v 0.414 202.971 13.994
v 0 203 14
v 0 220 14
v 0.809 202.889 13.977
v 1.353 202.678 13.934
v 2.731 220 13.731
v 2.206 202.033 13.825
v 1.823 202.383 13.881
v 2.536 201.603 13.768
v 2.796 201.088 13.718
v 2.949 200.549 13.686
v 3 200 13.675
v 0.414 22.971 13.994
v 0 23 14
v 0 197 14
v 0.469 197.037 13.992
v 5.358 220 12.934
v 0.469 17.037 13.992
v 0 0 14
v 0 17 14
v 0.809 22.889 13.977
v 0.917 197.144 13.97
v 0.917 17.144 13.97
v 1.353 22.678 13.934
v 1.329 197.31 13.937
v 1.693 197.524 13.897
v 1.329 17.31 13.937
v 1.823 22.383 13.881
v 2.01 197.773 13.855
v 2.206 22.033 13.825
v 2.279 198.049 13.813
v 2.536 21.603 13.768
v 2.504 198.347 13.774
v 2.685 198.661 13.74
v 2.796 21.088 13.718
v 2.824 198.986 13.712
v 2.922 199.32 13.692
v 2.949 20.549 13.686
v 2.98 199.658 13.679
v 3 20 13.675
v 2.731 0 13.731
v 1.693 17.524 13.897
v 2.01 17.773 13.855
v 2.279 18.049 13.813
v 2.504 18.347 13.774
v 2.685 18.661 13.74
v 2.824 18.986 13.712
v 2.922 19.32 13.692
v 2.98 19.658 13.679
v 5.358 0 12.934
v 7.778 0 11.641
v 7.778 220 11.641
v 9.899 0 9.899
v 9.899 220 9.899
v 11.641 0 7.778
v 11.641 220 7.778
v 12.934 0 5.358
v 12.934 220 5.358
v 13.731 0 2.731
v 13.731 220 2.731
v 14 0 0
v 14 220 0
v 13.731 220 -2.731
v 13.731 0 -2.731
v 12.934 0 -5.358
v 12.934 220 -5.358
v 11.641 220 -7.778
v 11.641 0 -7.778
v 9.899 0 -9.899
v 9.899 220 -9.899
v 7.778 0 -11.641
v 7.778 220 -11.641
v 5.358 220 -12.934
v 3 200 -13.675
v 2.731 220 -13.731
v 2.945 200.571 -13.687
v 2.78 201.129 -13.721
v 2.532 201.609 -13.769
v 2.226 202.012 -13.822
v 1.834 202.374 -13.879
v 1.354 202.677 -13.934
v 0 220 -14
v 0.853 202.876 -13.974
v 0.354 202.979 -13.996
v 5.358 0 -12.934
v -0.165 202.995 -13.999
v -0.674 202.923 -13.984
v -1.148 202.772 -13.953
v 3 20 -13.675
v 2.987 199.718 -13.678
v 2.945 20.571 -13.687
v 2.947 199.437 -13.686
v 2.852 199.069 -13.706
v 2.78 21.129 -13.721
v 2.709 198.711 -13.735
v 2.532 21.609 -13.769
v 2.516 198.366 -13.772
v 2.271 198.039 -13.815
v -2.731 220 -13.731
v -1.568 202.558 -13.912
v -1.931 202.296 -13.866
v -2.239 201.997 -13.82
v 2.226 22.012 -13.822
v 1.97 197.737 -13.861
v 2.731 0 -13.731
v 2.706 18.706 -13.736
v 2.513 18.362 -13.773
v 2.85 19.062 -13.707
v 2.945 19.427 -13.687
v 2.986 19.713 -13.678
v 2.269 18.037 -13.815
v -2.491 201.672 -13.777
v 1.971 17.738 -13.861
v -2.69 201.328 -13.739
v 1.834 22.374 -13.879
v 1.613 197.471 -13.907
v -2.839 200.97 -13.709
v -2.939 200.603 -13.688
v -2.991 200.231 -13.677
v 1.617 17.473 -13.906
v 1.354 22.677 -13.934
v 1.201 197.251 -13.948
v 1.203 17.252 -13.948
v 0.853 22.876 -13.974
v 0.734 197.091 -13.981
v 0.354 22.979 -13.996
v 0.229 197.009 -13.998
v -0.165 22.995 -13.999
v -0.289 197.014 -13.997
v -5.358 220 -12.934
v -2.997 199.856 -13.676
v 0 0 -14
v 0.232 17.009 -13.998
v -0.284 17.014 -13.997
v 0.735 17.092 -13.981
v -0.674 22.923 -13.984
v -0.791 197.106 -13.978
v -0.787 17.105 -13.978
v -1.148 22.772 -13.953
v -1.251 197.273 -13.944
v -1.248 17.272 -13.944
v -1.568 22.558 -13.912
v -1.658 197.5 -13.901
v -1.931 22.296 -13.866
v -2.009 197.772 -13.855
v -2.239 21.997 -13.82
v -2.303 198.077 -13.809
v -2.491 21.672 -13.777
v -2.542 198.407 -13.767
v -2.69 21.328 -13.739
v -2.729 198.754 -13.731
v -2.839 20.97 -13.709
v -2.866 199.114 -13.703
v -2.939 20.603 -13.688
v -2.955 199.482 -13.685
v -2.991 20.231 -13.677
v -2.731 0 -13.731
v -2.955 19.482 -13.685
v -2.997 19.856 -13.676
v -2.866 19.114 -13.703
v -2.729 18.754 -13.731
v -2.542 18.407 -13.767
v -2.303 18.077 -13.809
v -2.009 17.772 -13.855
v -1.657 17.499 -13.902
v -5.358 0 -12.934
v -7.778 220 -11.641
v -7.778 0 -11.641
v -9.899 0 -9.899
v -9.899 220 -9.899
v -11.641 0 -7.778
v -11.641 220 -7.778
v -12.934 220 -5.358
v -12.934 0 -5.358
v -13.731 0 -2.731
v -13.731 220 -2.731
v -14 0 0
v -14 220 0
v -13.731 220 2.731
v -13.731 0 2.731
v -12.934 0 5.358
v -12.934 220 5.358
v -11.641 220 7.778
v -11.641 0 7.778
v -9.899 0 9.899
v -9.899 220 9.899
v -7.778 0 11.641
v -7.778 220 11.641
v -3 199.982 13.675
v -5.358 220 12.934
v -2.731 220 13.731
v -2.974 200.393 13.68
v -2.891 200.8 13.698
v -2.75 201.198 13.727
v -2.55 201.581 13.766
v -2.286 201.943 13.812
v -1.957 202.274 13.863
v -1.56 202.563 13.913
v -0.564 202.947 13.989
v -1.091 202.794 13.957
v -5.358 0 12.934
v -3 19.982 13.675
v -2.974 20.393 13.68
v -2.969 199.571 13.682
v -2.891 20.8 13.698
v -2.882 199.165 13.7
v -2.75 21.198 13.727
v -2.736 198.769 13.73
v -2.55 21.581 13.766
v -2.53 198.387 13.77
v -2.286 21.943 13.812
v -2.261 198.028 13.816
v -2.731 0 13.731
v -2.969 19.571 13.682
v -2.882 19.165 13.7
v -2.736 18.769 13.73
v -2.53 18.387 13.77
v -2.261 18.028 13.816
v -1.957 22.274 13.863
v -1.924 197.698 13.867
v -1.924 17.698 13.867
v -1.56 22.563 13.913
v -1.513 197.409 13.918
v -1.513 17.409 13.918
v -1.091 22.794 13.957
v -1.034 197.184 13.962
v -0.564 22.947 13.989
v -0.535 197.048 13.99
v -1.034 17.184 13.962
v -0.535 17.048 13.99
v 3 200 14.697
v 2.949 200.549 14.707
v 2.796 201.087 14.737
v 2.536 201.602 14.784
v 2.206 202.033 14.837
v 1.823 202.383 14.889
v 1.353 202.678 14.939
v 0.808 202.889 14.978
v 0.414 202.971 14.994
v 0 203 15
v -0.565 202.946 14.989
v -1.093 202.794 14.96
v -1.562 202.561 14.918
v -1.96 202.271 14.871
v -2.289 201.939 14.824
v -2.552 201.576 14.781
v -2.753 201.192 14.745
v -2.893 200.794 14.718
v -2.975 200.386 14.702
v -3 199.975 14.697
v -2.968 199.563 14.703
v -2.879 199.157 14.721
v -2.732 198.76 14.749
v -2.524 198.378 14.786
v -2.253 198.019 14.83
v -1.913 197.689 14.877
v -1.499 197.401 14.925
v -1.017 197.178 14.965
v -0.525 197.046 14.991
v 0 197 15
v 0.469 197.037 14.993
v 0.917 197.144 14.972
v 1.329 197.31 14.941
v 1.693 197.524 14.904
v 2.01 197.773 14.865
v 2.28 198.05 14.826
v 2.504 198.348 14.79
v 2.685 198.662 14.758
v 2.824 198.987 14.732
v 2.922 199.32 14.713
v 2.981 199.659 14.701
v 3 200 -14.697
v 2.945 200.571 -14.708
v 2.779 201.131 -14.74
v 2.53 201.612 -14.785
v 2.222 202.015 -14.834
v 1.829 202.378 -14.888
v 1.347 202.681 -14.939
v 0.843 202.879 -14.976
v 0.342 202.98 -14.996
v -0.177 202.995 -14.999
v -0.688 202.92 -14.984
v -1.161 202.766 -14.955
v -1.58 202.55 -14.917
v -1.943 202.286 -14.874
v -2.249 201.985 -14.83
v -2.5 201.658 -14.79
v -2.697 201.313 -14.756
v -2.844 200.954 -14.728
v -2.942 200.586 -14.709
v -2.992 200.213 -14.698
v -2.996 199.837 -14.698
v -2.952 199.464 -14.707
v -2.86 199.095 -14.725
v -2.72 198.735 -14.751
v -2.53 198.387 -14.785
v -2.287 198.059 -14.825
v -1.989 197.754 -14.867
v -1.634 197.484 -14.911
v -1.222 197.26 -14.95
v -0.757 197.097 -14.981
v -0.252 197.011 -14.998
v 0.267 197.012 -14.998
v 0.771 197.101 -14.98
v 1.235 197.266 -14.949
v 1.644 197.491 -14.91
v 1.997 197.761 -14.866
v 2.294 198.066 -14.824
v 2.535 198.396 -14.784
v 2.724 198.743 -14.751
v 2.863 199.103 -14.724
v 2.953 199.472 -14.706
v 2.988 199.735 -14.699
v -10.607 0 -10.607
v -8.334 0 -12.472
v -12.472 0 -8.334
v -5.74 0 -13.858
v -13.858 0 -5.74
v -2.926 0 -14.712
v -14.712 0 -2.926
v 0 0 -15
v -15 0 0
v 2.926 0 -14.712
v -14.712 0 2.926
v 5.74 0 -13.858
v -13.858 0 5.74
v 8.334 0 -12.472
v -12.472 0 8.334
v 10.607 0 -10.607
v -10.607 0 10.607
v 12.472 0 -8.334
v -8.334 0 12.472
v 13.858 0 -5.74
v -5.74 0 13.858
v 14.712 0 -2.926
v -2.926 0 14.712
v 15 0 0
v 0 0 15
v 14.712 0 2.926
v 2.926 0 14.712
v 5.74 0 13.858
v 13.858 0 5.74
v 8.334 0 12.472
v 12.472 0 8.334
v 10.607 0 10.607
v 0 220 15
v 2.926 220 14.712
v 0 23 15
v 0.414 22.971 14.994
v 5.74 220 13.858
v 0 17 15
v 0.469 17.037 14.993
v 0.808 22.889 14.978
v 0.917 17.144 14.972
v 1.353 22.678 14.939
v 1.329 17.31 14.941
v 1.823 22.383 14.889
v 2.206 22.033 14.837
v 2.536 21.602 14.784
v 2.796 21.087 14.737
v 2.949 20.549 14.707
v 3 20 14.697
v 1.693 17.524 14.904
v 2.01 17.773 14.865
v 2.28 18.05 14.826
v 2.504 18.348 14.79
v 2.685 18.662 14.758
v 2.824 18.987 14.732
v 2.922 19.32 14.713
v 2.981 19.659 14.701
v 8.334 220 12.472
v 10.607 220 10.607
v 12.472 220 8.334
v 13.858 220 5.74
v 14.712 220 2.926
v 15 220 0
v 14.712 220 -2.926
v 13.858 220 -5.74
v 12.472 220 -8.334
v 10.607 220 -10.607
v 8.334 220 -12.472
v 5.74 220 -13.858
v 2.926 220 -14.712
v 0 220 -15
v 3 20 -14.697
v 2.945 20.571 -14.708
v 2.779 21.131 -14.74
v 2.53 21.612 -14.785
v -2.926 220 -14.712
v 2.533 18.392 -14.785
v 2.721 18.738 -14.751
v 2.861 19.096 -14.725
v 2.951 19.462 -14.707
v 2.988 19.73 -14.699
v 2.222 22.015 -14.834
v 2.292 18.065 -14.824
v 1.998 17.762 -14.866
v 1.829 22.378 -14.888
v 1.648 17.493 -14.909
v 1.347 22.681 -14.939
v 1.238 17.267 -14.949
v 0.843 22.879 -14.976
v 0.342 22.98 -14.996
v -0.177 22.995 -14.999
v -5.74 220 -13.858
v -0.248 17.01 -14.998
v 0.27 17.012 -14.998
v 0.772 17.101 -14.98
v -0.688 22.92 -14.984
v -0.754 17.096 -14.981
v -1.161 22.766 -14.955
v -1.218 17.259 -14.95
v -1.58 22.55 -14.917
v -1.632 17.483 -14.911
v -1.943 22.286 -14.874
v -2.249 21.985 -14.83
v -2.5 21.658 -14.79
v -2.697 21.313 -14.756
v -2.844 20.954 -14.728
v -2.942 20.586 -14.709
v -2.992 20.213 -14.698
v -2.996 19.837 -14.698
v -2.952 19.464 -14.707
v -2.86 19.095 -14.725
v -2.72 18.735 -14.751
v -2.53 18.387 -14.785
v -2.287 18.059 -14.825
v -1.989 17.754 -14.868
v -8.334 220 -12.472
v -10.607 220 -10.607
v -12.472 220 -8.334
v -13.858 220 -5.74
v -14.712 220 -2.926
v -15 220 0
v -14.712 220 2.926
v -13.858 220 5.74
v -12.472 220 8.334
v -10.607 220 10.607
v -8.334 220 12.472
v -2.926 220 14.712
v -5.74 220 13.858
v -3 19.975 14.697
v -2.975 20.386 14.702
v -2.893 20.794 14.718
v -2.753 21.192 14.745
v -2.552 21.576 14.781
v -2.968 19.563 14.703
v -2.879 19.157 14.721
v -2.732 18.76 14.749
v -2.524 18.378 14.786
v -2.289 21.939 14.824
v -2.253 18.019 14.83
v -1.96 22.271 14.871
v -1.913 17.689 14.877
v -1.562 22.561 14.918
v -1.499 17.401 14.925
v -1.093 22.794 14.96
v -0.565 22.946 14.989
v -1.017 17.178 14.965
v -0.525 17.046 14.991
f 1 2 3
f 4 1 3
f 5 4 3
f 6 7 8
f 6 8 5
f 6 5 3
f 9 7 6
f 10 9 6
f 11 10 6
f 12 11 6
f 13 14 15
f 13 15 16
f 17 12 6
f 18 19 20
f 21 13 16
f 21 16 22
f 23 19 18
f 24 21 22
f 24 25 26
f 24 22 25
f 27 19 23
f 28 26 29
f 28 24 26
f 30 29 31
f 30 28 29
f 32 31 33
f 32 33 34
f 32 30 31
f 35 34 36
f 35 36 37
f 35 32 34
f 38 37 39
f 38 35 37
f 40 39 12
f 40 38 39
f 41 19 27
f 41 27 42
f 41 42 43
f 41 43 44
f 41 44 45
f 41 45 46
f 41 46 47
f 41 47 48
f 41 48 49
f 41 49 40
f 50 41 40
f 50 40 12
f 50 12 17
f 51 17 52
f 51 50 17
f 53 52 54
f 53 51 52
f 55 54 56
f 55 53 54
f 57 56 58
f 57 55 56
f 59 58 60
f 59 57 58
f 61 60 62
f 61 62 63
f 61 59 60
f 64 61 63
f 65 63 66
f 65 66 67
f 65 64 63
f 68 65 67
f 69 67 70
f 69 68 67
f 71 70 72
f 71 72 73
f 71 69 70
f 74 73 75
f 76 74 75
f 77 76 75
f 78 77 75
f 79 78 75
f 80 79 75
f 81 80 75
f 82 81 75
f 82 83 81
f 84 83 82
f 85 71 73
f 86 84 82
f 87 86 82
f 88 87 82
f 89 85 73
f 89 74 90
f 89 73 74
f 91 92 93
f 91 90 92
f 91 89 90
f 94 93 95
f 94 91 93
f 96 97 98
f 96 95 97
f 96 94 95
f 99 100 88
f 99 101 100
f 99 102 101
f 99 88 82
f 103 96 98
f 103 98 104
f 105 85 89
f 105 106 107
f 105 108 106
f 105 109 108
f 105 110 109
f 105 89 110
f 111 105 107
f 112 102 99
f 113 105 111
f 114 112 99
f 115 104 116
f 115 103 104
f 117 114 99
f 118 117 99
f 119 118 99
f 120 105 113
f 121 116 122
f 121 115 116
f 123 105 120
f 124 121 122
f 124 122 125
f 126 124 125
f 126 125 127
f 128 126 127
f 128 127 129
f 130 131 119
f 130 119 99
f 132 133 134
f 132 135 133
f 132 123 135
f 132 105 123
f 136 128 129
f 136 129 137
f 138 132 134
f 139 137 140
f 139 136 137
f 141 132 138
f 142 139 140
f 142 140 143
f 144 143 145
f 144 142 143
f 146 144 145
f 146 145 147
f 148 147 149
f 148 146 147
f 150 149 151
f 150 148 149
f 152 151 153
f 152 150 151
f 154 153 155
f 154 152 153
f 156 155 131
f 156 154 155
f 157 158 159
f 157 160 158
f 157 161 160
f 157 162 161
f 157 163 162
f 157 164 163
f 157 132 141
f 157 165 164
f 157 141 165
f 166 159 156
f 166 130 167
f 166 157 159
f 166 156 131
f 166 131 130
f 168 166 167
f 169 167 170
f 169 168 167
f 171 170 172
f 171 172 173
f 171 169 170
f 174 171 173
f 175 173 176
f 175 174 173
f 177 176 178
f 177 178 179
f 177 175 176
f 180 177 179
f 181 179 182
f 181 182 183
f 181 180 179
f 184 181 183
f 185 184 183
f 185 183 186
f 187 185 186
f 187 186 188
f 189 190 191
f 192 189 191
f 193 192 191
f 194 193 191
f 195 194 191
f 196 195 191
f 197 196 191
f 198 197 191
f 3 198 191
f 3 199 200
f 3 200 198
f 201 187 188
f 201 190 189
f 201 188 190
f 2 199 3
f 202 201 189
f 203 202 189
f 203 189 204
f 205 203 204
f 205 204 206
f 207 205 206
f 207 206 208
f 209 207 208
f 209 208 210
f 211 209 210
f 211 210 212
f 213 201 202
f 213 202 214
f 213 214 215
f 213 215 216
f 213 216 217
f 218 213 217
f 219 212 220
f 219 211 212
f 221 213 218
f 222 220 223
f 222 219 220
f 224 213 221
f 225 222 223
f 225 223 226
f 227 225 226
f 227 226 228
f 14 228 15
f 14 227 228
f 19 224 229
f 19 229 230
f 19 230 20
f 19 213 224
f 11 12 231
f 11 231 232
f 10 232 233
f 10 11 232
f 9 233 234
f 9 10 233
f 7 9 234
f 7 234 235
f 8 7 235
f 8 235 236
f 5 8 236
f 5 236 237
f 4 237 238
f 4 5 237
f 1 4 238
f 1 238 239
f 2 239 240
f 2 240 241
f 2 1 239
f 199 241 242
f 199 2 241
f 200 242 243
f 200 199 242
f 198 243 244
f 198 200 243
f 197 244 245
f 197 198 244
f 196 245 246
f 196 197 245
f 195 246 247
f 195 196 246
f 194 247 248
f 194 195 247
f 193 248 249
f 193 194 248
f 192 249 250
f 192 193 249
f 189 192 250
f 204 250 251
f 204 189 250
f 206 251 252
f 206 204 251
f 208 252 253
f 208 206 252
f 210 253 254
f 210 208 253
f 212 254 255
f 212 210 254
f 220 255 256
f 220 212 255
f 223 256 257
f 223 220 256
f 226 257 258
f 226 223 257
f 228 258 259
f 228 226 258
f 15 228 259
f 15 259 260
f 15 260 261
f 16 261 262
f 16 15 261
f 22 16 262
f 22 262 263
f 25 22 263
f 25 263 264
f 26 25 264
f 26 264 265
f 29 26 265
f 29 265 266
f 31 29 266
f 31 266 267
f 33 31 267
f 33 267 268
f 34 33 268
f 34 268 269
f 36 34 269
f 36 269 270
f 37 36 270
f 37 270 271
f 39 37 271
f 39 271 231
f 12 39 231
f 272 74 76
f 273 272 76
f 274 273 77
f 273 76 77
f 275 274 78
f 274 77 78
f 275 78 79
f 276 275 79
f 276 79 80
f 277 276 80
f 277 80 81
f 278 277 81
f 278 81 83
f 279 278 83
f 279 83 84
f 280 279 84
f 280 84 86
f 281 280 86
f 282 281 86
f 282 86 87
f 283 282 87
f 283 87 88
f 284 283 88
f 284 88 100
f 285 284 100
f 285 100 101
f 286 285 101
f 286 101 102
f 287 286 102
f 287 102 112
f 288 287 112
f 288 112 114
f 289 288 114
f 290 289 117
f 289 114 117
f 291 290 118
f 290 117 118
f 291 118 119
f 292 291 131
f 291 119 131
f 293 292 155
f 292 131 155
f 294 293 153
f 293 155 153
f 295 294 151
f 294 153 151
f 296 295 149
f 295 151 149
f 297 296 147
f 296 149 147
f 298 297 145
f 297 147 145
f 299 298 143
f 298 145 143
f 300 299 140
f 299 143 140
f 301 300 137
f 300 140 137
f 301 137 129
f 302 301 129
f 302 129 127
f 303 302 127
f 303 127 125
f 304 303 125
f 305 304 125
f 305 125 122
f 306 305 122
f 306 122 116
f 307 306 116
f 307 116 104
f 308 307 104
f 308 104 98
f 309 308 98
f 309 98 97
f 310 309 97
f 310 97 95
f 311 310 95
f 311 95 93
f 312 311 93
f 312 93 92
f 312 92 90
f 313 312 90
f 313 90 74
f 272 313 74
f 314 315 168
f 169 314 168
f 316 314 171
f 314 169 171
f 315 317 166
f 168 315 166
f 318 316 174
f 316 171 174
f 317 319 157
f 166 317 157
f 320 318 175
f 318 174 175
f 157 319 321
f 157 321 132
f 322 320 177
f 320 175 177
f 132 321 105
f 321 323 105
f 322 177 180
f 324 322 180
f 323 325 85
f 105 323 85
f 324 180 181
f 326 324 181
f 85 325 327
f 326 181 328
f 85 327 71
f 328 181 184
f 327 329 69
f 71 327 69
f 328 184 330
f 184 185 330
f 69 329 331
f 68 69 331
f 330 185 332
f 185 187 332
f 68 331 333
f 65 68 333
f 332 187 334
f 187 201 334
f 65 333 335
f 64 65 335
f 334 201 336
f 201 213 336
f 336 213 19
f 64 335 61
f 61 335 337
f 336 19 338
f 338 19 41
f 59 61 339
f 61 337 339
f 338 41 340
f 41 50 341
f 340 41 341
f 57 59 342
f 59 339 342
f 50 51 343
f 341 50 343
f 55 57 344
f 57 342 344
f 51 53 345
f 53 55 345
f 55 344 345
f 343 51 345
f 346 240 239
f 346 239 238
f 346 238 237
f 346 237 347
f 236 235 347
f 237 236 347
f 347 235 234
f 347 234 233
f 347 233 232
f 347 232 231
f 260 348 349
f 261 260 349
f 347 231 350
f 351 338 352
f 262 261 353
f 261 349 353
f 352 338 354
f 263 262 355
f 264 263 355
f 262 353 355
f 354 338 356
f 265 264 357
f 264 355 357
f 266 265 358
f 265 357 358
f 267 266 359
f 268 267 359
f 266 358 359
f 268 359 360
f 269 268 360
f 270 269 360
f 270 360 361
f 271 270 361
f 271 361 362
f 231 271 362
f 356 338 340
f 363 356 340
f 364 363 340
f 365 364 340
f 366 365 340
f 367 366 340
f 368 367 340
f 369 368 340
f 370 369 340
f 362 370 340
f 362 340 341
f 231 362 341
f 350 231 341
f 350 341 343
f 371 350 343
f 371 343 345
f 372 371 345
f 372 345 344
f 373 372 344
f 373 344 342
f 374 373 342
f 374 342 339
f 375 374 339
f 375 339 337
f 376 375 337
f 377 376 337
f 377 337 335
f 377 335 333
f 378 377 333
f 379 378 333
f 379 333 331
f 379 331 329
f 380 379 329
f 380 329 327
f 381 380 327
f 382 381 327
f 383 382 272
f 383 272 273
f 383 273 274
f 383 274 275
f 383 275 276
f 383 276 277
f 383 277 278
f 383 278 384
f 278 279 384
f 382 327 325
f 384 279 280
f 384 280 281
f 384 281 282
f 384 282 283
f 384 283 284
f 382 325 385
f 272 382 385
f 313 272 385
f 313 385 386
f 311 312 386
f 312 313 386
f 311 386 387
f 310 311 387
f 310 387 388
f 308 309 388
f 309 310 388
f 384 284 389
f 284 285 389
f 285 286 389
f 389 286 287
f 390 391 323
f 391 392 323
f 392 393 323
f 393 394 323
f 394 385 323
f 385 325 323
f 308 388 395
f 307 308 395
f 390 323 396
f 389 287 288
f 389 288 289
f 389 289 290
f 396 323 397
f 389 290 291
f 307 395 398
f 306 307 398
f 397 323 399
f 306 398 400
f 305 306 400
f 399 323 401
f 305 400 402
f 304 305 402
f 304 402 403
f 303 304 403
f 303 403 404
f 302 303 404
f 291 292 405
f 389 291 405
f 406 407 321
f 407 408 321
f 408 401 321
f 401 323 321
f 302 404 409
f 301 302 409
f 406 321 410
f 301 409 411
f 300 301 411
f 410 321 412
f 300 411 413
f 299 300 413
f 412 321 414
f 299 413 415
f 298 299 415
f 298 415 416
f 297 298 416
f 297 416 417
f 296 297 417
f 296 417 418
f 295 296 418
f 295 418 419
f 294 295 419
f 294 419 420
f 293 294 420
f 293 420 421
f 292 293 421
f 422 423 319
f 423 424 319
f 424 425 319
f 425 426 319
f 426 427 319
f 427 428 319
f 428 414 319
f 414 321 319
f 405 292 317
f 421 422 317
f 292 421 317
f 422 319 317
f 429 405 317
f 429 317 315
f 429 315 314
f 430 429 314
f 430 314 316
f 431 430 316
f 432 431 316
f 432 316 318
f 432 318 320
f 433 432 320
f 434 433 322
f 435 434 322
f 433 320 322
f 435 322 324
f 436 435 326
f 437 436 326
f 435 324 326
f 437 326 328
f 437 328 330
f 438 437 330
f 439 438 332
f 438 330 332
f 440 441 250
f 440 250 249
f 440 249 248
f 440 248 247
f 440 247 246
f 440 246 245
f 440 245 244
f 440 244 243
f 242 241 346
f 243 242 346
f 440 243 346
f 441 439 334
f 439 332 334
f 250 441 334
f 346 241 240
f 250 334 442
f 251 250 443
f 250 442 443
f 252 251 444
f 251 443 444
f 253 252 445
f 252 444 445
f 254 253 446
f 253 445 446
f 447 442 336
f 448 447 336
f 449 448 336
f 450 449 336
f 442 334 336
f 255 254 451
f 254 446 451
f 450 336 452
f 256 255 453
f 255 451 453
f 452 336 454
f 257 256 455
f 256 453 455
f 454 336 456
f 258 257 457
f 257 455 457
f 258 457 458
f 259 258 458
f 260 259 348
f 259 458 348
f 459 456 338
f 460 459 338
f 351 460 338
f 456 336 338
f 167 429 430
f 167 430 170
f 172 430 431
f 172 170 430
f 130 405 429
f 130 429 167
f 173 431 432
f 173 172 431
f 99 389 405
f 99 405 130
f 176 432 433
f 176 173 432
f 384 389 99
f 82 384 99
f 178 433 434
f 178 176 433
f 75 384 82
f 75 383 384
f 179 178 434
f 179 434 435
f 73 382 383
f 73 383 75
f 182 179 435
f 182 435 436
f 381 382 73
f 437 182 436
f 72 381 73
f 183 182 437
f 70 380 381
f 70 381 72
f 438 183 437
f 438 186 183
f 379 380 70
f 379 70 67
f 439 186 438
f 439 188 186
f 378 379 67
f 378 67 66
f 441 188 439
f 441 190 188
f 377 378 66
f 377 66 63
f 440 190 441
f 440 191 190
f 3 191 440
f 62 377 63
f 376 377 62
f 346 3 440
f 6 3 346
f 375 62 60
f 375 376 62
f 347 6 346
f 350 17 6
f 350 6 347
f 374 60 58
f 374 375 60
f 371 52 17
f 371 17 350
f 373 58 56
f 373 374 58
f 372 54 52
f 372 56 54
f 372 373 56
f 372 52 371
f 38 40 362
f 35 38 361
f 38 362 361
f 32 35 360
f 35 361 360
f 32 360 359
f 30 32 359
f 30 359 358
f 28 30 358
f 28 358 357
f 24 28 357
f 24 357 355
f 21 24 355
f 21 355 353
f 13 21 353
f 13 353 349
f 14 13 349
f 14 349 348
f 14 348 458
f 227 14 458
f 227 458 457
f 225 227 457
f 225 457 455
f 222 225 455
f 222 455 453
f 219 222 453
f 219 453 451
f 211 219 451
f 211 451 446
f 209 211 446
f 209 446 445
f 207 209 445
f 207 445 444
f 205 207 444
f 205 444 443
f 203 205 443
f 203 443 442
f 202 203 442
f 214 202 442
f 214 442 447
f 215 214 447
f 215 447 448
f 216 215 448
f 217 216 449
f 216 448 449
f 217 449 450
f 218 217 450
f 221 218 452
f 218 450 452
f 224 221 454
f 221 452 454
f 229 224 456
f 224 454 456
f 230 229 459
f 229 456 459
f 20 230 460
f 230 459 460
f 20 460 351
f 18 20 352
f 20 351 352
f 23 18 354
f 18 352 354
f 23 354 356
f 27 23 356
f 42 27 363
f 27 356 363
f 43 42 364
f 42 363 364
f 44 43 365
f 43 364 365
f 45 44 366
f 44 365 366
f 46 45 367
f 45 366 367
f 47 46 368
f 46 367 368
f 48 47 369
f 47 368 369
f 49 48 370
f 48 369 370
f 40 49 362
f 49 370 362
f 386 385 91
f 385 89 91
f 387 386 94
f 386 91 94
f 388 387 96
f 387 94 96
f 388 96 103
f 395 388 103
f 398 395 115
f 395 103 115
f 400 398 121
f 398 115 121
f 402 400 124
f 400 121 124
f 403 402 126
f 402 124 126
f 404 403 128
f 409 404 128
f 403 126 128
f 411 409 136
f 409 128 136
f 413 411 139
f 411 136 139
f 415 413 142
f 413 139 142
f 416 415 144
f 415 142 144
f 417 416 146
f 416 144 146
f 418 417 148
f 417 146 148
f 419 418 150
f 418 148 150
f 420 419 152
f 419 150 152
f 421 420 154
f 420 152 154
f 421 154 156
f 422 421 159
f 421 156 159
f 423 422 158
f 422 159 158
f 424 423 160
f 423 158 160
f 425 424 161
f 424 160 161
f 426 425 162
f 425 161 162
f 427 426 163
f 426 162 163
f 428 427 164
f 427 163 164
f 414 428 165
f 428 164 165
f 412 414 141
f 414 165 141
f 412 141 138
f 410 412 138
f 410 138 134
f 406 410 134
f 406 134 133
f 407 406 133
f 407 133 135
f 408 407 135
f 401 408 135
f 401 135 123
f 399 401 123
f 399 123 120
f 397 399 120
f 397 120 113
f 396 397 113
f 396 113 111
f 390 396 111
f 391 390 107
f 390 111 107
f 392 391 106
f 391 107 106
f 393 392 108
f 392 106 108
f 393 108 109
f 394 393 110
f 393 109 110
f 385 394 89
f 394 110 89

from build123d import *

# Parameters (mm, degrees)
SKETCH1_R           = 15
SKETCH1_R_2         = 14
BOSS_EXTRUDE1_DEPTH = 220
SKETCH2_R           = 3
CUT_EXTRUDE1_DEPTH  = 15


with BuildPart() as part:
    # Sketch1 → Boss-Extrude1 (new body)
    with BuildSketch(Plane(origin=(0, 0, 0), x_dir=(1, 0, 0), z_dir=(0, 1, 0))):
        with Locations(Location((0, 0, 0), (0, 0, 270))):
            Circle(SKETCH1_R)
        with Locations(Location((0, 0, 0), (0, 0, 270))):
            Circle(SKETCH1_R_2, mode=Mode.SUBTRACT)
    extrude(amount=BOSS_EXTRUDE1_DEPTH)

    # Sketch2 → Cut-Extrude1 (cut, symmetric)
    with BuildSketch(Plane.XY):
        with Locations((0, 200)):
            Circle(SKETCH2_R)
        with Locations((0, 20)):
            Circle(SKETCH2_R)
    extrude(amount=CUT_EXTRUDE1_DEPTH, both=True, mode=Mode.SUBTRACT)


solid = part.part
